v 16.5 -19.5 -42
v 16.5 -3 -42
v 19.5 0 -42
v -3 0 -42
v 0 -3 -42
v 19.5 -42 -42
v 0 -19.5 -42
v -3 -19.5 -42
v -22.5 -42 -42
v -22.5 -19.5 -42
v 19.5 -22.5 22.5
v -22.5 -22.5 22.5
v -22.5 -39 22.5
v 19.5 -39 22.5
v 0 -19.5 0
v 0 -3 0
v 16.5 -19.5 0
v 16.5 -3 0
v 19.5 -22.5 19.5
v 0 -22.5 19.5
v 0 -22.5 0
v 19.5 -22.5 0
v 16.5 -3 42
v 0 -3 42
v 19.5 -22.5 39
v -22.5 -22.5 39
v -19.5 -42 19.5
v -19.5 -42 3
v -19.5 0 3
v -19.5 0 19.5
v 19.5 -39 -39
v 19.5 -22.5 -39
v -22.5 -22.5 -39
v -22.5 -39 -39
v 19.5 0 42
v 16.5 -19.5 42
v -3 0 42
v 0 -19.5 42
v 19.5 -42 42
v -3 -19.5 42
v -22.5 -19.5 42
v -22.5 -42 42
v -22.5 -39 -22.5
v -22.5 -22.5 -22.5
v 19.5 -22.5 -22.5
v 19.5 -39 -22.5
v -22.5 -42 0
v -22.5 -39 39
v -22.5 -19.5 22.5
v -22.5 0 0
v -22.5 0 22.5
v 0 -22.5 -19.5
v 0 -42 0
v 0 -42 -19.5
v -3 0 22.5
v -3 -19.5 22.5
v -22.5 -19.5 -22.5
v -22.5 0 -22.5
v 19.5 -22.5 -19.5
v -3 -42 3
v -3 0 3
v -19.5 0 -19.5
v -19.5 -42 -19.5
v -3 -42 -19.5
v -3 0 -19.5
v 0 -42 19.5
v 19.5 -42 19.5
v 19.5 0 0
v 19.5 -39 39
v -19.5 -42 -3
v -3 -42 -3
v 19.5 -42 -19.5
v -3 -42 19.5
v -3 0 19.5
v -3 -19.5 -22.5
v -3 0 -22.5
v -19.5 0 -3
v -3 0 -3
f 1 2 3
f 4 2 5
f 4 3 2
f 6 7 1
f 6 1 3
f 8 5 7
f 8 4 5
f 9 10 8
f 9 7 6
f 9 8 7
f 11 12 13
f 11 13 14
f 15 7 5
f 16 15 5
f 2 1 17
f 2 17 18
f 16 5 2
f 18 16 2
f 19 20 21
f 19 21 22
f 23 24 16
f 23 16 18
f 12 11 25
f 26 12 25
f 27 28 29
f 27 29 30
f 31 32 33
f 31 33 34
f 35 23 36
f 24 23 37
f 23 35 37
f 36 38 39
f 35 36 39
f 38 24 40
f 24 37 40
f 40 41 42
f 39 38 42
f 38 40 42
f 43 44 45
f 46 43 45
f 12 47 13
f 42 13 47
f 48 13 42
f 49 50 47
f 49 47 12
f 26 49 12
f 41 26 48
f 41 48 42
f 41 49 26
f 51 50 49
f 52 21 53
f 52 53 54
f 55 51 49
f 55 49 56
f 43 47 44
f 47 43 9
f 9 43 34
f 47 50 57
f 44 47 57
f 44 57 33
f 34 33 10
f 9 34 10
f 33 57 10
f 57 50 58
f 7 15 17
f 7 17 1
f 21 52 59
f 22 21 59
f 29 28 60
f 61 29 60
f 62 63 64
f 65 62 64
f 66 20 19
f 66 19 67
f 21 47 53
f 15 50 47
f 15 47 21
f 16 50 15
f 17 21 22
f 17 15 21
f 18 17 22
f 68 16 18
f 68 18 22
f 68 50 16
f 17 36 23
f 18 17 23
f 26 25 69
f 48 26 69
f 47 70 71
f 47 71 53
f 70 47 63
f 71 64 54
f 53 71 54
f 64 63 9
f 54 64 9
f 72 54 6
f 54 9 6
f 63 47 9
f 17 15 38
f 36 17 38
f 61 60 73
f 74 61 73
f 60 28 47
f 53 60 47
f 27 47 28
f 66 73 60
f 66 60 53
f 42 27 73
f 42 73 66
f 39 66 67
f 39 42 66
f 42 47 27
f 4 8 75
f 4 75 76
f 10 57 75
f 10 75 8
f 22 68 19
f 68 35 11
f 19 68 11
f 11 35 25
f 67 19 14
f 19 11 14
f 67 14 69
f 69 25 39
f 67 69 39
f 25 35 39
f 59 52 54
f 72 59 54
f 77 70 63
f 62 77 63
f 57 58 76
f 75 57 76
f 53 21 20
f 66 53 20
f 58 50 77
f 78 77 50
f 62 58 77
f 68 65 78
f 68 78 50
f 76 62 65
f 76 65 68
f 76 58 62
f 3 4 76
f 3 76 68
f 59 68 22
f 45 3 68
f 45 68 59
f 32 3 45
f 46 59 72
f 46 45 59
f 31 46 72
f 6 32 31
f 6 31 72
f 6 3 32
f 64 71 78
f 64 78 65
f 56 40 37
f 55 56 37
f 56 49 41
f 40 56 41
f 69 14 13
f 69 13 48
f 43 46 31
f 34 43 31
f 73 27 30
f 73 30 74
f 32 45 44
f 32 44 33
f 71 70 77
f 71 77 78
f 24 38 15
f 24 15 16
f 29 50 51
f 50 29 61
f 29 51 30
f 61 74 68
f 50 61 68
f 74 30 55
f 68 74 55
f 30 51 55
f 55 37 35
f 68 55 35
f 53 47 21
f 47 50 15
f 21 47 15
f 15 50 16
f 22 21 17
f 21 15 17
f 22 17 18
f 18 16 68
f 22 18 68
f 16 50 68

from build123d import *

# Parameters (mm, degrees)
F0_W     = 22.5
F0_H     = 22.5
F0_W_2   = 16.5
F0_H_2   = 16.5
F1_DEPTH = 42
F2_W     = 22.5
F2_H     = 22.5
F2_W_2   = 16.5
F2_H_2   = 16.5
F3_DEPTH = 42
F4_W     = 22.5
F4_H     = 22.5
F4_W_2   = 16.5
F4_H_2   = 16.5
F5_DEPTH = 42


with BuildPart() as f1:
    # F0 (on Front) → F1 (new body)
    with BuildSketch(Plane.XZ):
        with Locations((-11.25, 11.25)):
            Rectangle(F0_W, F0_H)
        with Locations((-11.25, 11.25)):
            Rectangle(F0_W_2, F0_H_2, mode=Mode.SUBTRACT)
    extrude(amount=F1_DEPTH)

    # F2 (on face) → F3 (join)
    with BuildSketch(Plane(origin=(-22.5, 0, 0), x_dir=(0, -1, 0), z_dir=(-1, 0, 0))):
        with Locations((30.75, 30.75)):
            Rectangle(F2_W, F2_H)
        with Locations((30.75, 30.75)):
            Rectangle(F2_W_2, F2_H_2, mode=Mode.SUBTRACT)
    extrude(amount=-F3_DEPTH)

    # F4 (on face) → F5 (join)
    with BuildSketch(Plane.XY.offset(42)):
        with Locations((8.25, -11.25)):
            Rectangle(F4_W, F4_H)
        with Locations((8.25, -11.25)):
            Rectangle(F4_W_2, F4_H_2, mode=Mode.SUBTRACT)
    extrude(amount=-F5_DEPTH)


with BuildPart() as f6_1:
    # F6: instance of F1
    add(f1.part.mirror(Plane.XY))


solid = Compound([f1.part, f6_1.part])
